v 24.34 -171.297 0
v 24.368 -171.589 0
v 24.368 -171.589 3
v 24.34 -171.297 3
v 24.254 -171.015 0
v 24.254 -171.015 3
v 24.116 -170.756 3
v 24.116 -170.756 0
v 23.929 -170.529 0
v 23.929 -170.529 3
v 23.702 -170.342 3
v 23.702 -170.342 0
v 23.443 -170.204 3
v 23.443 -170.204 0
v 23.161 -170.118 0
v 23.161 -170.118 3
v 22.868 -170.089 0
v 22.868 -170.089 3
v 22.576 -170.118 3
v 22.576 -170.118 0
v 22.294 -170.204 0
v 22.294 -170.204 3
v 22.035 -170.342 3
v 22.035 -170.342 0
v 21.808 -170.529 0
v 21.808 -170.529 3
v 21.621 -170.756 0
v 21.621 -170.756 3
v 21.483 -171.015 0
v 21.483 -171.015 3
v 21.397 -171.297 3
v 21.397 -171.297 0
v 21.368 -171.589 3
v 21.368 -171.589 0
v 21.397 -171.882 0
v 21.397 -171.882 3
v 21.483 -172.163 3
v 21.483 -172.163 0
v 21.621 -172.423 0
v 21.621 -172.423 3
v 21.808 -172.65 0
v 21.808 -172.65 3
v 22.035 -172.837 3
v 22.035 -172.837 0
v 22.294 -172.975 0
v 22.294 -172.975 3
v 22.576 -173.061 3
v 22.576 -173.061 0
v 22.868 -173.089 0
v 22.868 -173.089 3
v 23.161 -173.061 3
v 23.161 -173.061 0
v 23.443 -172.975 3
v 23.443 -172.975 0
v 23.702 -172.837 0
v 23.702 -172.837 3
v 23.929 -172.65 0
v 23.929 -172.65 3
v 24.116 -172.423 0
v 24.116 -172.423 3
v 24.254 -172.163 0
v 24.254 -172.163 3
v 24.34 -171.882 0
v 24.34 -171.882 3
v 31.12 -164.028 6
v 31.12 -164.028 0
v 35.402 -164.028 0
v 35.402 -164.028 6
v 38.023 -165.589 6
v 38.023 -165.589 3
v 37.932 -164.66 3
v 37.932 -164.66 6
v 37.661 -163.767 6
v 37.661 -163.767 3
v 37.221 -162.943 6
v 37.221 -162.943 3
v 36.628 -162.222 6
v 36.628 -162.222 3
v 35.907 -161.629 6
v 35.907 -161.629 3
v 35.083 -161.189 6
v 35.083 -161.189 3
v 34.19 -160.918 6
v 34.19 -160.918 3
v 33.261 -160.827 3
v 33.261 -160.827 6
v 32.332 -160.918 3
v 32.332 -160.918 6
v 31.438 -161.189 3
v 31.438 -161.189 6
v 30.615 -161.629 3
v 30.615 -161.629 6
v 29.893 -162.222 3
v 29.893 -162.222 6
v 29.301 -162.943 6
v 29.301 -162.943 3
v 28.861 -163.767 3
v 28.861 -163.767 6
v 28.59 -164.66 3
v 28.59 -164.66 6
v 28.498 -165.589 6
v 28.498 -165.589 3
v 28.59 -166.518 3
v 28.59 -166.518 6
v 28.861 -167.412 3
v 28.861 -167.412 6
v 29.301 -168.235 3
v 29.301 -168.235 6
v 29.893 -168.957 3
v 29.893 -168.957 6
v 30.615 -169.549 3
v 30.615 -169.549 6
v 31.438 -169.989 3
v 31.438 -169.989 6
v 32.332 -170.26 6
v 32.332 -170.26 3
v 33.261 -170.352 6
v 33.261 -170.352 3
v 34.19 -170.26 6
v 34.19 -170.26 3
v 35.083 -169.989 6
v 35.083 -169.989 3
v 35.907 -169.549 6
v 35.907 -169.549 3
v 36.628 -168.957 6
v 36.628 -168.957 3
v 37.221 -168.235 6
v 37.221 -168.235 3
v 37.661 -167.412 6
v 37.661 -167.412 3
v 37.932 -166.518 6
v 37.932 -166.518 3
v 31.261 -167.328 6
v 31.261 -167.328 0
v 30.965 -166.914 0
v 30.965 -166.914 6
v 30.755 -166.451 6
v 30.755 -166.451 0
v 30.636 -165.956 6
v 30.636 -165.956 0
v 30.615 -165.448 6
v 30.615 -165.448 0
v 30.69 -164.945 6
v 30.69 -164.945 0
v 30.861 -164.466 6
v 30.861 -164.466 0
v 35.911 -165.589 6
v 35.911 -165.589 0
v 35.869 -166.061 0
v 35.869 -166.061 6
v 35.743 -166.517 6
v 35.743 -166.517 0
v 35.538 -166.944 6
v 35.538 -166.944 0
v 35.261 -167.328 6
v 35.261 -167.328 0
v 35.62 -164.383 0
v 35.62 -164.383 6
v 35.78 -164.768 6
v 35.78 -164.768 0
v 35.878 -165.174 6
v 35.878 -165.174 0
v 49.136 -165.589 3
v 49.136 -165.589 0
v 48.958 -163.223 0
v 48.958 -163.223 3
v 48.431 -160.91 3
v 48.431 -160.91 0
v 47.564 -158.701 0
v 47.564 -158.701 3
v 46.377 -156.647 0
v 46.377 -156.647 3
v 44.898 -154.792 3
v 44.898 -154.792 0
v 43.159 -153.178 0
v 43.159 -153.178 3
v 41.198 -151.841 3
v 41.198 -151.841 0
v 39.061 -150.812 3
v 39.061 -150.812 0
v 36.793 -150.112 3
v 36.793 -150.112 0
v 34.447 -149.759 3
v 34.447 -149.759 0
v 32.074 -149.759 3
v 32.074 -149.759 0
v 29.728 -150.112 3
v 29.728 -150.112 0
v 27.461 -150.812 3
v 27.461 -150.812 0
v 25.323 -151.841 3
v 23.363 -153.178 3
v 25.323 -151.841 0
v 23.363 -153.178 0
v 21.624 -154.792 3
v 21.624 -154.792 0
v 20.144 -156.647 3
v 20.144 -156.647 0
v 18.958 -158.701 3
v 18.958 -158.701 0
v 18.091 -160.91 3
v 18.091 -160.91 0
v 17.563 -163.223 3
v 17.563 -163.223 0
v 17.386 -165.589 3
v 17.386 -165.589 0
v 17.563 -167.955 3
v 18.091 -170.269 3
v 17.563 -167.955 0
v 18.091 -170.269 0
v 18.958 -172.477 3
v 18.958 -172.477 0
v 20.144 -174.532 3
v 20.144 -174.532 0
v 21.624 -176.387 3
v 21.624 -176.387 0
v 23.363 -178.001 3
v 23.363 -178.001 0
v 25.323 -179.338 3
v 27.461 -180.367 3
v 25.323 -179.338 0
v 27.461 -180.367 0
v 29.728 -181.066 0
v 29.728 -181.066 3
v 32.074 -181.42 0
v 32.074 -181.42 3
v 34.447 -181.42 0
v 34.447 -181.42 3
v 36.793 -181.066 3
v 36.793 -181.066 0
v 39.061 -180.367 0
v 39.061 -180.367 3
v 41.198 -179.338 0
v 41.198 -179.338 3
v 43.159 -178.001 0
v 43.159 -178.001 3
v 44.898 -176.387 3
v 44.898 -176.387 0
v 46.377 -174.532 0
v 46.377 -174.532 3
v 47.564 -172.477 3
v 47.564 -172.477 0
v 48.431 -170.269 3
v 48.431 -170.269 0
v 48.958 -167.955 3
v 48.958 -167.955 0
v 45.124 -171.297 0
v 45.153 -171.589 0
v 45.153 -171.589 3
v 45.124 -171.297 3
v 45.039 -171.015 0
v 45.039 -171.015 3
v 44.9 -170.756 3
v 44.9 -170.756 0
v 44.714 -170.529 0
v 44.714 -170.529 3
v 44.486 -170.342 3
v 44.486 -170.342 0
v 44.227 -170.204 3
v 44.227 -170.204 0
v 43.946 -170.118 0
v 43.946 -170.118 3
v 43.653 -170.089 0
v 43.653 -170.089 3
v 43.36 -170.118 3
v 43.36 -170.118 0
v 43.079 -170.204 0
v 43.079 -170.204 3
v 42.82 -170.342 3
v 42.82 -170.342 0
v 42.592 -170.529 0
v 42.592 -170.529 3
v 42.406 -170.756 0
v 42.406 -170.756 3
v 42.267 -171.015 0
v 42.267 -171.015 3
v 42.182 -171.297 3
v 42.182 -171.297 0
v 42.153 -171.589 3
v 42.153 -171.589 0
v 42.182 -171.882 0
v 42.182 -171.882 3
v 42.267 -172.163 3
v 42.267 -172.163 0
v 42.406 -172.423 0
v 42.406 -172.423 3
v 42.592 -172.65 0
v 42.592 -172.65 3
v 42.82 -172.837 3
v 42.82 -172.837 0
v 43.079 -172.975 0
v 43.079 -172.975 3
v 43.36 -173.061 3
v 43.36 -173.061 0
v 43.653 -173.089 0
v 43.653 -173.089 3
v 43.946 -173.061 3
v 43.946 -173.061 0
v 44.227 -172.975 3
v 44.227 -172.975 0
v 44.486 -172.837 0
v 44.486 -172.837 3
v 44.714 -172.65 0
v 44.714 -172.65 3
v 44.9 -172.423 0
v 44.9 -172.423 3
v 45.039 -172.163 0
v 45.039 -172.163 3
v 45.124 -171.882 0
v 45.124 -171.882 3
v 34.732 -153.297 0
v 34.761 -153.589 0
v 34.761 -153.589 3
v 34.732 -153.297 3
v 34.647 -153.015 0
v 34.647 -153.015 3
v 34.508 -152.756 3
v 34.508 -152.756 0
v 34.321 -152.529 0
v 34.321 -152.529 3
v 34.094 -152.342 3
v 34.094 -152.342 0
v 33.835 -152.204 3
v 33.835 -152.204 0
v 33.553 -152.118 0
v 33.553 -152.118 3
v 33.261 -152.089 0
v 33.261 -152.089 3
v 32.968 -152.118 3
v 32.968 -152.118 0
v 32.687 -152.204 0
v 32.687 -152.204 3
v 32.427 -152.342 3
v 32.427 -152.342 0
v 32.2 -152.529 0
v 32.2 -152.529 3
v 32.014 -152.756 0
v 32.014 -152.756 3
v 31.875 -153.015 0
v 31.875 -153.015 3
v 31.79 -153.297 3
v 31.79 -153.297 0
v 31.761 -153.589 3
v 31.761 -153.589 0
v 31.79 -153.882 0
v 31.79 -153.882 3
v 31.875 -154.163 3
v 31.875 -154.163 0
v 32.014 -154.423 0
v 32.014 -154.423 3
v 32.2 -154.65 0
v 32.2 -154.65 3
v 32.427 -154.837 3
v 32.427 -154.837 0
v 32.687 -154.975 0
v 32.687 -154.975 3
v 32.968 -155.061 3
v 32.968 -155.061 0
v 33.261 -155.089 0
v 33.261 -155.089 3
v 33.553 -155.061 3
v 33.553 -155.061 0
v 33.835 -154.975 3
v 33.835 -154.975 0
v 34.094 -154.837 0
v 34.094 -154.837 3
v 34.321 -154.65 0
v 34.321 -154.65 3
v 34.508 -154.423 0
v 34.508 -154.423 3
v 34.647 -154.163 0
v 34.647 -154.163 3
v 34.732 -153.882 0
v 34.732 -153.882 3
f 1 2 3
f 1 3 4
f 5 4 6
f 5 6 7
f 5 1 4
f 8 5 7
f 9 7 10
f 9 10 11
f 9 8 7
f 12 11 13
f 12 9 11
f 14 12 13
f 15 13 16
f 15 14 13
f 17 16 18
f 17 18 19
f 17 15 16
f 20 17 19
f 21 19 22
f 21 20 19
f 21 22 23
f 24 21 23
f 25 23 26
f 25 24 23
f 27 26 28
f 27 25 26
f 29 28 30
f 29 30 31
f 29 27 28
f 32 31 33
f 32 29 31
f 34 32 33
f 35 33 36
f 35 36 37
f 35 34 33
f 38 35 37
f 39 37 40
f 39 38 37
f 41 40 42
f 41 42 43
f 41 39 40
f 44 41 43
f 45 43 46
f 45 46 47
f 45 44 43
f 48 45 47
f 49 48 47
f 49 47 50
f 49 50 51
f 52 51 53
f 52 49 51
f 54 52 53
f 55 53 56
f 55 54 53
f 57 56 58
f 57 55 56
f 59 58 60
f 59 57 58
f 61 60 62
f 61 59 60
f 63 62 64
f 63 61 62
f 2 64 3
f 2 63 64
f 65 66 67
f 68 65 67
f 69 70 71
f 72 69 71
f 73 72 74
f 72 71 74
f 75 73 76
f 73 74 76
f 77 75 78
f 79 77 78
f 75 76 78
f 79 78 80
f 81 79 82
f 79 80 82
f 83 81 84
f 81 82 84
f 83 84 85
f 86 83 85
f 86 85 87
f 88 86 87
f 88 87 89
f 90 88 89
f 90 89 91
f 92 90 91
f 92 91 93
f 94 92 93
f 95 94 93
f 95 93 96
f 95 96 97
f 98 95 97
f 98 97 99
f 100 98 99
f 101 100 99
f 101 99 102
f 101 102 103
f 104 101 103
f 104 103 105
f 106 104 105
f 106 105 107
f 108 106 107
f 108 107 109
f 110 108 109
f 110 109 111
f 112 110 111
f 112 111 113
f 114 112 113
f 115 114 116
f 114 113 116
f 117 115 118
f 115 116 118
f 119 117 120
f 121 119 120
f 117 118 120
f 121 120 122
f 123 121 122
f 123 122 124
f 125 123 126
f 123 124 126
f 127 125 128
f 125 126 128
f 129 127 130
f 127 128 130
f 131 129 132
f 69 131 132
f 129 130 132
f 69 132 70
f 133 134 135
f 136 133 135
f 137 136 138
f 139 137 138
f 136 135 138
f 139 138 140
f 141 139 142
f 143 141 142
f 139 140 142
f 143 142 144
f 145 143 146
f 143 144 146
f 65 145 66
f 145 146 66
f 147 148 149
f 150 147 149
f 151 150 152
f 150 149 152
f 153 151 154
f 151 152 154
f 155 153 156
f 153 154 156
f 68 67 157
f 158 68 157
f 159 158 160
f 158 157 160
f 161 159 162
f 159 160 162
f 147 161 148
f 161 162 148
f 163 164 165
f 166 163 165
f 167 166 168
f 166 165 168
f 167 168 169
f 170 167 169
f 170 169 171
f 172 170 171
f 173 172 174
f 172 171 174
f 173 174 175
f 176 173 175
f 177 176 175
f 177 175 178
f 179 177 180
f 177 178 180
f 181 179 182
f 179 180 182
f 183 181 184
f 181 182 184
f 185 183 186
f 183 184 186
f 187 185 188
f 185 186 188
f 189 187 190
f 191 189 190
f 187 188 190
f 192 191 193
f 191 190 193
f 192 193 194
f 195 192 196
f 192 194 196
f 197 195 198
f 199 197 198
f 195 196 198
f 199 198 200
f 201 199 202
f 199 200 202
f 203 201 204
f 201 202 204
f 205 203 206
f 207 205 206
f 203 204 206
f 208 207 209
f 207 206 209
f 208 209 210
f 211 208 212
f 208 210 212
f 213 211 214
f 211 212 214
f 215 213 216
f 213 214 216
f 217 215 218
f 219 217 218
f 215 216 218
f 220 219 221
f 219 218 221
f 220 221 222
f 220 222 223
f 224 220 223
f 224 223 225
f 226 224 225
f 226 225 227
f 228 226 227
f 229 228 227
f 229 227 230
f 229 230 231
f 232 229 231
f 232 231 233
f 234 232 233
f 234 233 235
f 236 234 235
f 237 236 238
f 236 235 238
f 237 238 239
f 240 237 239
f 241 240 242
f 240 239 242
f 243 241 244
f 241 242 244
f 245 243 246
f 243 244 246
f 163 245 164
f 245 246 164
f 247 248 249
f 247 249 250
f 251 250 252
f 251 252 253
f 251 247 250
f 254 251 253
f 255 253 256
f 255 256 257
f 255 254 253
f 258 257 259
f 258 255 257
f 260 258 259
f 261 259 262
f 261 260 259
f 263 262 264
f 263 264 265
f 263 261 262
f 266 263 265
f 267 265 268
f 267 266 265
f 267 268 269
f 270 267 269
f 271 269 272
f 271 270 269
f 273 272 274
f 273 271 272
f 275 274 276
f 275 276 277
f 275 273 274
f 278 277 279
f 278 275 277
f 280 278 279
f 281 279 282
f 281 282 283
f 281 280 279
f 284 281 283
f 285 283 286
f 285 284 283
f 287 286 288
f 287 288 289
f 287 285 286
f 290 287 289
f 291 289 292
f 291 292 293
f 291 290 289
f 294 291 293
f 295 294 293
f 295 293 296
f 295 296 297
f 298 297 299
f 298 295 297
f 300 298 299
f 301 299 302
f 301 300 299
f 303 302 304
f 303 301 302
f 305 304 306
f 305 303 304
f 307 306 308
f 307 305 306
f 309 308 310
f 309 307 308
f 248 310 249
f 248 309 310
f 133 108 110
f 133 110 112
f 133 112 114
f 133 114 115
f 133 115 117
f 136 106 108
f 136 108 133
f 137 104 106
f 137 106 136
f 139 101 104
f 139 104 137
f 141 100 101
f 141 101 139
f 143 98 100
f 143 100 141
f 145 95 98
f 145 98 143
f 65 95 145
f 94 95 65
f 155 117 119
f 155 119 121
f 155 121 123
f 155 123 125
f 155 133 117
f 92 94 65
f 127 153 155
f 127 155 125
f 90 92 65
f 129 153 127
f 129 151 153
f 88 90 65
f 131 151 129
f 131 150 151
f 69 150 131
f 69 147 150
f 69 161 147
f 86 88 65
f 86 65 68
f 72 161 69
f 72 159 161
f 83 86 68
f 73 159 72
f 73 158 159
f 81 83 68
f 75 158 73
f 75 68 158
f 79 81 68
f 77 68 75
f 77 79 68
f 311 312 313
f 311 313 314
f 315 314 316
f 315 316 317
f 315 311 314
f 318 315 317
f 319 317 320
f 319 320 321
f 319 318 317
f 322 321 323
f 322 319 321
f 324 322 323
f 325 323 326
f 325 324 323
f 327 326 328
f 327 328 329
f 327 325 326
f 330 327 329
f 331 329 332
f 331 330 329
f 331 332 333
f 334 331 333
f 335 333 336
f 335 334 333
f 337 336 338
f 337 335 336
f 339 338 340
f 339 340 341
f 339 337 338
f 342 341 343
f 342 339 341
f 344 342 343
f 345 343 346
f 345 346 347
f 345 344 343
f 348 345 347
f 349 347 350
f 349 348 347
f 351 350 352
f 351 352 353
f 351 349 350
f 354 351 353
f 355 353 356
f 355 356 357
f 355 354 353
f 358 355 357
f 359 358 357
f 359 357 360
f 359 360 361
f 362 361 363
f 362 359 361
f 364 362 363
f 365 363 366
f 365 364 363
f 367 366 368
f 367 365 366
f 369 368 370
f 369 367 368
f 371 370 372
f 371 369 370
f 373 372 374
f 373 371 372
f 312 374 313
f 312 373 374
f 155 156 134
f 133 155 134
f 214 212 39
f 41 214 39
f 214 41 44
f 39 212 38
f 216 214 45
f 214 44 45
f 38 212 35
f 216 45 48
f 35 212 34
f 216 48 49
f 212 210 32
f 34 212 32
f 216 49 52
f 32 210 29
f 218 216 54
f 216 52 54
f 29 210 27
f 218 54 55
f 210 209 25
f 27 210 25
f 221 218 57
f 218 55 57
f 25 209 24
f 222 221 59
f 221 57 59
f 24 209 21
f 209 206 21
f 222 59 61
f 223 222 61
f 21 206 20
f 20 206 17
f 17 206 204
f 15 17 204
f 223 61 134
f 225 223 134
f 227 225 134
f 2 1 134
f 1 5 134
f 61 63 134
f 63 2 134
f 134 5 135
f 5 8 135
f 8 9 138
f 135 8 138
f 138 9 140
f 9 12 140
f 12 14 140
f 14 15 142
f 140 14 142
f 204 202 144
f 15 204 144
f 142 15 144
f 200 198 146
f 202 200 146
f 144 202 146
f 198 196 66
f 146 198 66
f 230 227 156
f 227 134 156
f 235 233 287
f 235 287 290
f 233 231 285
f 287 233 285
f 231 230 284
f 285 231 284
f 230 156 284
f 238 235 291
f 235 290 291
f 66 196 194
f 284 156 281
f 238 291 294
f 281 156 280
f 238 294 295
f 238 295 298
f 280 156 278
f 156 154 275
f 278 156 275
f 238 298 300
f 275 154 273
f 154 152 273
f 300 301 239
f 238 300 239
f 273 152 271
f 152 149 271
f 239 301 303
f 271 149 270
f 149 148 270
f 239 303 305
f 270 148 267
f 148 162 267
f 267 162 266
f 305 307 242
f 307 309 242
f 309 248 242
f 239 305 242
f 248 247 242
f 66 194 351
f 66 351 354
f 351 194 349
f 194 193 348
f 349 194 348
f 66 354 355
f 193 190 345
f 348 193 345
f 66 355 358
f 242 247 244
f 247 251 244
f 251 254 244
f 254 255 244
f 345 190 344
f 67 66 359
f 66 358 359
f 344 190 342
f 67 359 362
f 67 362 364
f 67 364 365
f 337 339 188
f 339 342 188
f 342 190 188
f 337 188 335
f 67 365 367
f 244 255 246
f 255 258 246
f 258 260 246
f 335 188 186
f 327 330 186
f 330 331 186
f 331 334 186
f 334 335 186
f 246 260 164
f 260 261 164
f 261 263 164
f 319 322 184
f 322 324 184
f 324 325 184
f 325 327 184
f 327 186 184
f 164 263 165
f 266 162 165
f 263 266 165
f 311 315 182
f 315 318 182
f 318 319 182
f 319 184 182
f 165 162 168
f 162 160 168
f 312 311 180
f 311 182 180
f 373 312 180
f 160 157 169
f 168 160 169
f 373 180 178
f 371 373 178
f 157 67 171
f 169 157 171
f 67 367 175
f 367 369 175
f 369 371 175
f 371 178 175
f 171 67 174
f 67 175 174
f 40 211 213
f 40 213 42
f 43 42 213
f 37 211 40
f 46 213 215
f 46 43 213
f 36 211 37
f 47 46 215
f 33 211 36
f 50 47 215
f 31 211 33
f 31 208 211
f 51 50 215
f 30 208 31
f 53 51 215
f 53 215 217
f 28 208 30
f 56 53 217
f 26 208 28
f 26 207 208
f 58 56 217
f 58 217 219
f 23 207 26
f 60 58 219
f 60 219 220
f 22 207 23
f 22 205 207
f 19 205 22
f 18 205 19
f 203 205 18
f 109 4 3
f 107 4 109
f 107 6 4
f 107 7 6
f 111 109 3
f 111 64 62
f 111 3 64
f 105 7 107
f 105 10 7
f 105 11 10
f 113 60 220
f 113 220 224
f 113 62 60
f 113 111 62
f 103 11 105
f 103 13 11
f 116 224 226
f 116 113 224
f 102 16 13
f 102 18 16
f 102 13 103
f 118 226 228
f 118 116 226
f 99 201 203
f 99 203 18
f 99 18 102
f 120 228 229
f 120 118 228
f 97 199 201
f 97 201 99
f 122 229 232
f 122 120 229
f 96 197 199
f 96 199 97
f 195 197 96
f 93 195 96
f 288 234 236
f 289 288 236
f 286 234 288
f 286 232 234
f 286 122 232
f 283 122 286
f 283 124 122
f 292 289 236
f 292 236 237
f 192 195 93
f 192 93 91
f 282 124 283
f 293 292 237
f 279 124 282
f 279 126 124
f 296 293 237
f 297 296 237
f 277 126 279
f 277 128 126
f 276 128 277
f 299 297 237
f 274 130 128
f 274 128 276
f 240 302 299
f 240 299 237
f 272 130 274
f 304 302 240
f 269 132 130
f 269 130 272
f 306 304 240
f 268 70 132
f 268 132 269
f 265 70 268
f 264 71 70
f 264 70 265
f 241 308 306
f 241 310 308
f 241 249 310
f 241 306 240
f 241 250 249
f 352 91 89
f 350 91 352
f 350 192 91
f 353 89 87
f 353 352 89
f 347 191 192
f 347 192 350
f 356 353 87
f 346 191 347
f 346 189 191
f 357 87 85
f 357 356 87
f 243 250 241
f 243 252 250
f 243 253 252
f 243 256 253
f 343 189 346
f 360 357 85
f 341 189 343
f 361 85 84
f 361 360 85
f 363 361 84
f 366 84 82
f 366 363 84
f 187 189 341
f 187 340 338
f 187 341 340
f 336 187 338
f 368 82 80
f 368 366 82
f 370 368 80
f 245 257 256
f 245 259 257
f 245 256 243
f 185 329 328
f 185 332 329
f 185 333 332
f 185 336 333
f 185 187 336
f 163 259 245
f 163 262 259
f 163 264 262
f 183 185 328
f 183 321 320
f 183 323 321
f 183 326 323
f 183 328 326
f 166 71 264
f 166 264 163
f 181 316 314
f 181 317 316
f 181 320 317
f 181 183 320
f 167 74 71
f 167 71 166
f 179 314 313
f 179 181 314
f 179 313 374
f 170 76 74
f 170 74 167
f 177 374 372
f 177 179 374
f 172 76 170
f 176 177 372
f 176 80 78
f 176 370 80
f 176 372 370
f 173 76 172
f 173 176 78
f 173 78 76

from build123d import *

# Parameters (mm, degrees)
F1_R     = 4.7625
F2_DEPTH = 6
F1_R_2   = 15.875
F1_R_3   = 1.5
F3_DEPTH = 3


with BuildPart() as f2:
    # F1 (on Top) → F2 (new body)
    with BuildSketch(Plane.XY):
        with Locations((33.2608025707, -165.5893599715)):
            Circle(F1_R)
        with BuildLine():
            ThreePointArc((35.2608025707, -167.3278938366), (33.2608025707, -168.2393599715), (31.2608025707, -167.3278938366))
            ThreePointArc((31.2608025707, -167.3278938366), (30.6132217472, -165.7025667882), (31.1196992314, -164.0278938366))
            ThreePointArc((31.1196992314, -164.0278938366), (33.2608025707, -162.9393599715), (35.4019059099, -164.0278938366))
            ThreePointArc((35.4019059099, -164.0278938366), (35.7803683913, -164.768209513), (35.9108025707, -165.5893599715))
            ThreePointArc((35.9108025707, -165.5893599715), (35.7429891068, -166.5173955312), (35.2608025707, -167.3278938366))
        make_face(mode=Mode.SUBTRACT)
        with BuildLine():
            ThreePointArc((35.4019059099, -164.0278938366), (33.2608025707, -162.9393599715), (31.1196992314, -164.0278938366))
            Line((31.1196992314, -164.0278938366), (35.4019059099, -164.0278938366))
        make_face()
        with BuildLine():
            Line((35.2608025707, -167.3278938366), (31.2608025707, -167.3278938366))
            ThreePointArc((31.2608025707, -167.3278938366), (33.2608025707, -168.2393599715), (35.2608025707, -167.3278938366))
        make_face()
    extrude(amount=F2_DEPTH)

    # F1 (on Top) → F3 (join)
    with BuildSketch(Plane.XY):
        with Locations((33.2608025707, -165.5893599715)):
            Circle(F1_R_2)
        with Locations((22.8684977253, -171.5893599715)):
            Circle(F1_R_3, mode=Mode.SUBTRACT)
        with Locations((43.6531074161, -171.5893599715)):
            Circle(F1_R_3, mode=Mode.SUBTRACT)
        with Locations((33.2608025707, -165.5893599715)):
            Circle(F1_R, mode=Mode.SUBTRACT)
        with Locations((33.2608025707, -153.5893599715)):
            Circle(F1_R_3, mode=Mode.SUBTRACT)
    extrude(amount=F3_DEPTH)


solid = f2.part
